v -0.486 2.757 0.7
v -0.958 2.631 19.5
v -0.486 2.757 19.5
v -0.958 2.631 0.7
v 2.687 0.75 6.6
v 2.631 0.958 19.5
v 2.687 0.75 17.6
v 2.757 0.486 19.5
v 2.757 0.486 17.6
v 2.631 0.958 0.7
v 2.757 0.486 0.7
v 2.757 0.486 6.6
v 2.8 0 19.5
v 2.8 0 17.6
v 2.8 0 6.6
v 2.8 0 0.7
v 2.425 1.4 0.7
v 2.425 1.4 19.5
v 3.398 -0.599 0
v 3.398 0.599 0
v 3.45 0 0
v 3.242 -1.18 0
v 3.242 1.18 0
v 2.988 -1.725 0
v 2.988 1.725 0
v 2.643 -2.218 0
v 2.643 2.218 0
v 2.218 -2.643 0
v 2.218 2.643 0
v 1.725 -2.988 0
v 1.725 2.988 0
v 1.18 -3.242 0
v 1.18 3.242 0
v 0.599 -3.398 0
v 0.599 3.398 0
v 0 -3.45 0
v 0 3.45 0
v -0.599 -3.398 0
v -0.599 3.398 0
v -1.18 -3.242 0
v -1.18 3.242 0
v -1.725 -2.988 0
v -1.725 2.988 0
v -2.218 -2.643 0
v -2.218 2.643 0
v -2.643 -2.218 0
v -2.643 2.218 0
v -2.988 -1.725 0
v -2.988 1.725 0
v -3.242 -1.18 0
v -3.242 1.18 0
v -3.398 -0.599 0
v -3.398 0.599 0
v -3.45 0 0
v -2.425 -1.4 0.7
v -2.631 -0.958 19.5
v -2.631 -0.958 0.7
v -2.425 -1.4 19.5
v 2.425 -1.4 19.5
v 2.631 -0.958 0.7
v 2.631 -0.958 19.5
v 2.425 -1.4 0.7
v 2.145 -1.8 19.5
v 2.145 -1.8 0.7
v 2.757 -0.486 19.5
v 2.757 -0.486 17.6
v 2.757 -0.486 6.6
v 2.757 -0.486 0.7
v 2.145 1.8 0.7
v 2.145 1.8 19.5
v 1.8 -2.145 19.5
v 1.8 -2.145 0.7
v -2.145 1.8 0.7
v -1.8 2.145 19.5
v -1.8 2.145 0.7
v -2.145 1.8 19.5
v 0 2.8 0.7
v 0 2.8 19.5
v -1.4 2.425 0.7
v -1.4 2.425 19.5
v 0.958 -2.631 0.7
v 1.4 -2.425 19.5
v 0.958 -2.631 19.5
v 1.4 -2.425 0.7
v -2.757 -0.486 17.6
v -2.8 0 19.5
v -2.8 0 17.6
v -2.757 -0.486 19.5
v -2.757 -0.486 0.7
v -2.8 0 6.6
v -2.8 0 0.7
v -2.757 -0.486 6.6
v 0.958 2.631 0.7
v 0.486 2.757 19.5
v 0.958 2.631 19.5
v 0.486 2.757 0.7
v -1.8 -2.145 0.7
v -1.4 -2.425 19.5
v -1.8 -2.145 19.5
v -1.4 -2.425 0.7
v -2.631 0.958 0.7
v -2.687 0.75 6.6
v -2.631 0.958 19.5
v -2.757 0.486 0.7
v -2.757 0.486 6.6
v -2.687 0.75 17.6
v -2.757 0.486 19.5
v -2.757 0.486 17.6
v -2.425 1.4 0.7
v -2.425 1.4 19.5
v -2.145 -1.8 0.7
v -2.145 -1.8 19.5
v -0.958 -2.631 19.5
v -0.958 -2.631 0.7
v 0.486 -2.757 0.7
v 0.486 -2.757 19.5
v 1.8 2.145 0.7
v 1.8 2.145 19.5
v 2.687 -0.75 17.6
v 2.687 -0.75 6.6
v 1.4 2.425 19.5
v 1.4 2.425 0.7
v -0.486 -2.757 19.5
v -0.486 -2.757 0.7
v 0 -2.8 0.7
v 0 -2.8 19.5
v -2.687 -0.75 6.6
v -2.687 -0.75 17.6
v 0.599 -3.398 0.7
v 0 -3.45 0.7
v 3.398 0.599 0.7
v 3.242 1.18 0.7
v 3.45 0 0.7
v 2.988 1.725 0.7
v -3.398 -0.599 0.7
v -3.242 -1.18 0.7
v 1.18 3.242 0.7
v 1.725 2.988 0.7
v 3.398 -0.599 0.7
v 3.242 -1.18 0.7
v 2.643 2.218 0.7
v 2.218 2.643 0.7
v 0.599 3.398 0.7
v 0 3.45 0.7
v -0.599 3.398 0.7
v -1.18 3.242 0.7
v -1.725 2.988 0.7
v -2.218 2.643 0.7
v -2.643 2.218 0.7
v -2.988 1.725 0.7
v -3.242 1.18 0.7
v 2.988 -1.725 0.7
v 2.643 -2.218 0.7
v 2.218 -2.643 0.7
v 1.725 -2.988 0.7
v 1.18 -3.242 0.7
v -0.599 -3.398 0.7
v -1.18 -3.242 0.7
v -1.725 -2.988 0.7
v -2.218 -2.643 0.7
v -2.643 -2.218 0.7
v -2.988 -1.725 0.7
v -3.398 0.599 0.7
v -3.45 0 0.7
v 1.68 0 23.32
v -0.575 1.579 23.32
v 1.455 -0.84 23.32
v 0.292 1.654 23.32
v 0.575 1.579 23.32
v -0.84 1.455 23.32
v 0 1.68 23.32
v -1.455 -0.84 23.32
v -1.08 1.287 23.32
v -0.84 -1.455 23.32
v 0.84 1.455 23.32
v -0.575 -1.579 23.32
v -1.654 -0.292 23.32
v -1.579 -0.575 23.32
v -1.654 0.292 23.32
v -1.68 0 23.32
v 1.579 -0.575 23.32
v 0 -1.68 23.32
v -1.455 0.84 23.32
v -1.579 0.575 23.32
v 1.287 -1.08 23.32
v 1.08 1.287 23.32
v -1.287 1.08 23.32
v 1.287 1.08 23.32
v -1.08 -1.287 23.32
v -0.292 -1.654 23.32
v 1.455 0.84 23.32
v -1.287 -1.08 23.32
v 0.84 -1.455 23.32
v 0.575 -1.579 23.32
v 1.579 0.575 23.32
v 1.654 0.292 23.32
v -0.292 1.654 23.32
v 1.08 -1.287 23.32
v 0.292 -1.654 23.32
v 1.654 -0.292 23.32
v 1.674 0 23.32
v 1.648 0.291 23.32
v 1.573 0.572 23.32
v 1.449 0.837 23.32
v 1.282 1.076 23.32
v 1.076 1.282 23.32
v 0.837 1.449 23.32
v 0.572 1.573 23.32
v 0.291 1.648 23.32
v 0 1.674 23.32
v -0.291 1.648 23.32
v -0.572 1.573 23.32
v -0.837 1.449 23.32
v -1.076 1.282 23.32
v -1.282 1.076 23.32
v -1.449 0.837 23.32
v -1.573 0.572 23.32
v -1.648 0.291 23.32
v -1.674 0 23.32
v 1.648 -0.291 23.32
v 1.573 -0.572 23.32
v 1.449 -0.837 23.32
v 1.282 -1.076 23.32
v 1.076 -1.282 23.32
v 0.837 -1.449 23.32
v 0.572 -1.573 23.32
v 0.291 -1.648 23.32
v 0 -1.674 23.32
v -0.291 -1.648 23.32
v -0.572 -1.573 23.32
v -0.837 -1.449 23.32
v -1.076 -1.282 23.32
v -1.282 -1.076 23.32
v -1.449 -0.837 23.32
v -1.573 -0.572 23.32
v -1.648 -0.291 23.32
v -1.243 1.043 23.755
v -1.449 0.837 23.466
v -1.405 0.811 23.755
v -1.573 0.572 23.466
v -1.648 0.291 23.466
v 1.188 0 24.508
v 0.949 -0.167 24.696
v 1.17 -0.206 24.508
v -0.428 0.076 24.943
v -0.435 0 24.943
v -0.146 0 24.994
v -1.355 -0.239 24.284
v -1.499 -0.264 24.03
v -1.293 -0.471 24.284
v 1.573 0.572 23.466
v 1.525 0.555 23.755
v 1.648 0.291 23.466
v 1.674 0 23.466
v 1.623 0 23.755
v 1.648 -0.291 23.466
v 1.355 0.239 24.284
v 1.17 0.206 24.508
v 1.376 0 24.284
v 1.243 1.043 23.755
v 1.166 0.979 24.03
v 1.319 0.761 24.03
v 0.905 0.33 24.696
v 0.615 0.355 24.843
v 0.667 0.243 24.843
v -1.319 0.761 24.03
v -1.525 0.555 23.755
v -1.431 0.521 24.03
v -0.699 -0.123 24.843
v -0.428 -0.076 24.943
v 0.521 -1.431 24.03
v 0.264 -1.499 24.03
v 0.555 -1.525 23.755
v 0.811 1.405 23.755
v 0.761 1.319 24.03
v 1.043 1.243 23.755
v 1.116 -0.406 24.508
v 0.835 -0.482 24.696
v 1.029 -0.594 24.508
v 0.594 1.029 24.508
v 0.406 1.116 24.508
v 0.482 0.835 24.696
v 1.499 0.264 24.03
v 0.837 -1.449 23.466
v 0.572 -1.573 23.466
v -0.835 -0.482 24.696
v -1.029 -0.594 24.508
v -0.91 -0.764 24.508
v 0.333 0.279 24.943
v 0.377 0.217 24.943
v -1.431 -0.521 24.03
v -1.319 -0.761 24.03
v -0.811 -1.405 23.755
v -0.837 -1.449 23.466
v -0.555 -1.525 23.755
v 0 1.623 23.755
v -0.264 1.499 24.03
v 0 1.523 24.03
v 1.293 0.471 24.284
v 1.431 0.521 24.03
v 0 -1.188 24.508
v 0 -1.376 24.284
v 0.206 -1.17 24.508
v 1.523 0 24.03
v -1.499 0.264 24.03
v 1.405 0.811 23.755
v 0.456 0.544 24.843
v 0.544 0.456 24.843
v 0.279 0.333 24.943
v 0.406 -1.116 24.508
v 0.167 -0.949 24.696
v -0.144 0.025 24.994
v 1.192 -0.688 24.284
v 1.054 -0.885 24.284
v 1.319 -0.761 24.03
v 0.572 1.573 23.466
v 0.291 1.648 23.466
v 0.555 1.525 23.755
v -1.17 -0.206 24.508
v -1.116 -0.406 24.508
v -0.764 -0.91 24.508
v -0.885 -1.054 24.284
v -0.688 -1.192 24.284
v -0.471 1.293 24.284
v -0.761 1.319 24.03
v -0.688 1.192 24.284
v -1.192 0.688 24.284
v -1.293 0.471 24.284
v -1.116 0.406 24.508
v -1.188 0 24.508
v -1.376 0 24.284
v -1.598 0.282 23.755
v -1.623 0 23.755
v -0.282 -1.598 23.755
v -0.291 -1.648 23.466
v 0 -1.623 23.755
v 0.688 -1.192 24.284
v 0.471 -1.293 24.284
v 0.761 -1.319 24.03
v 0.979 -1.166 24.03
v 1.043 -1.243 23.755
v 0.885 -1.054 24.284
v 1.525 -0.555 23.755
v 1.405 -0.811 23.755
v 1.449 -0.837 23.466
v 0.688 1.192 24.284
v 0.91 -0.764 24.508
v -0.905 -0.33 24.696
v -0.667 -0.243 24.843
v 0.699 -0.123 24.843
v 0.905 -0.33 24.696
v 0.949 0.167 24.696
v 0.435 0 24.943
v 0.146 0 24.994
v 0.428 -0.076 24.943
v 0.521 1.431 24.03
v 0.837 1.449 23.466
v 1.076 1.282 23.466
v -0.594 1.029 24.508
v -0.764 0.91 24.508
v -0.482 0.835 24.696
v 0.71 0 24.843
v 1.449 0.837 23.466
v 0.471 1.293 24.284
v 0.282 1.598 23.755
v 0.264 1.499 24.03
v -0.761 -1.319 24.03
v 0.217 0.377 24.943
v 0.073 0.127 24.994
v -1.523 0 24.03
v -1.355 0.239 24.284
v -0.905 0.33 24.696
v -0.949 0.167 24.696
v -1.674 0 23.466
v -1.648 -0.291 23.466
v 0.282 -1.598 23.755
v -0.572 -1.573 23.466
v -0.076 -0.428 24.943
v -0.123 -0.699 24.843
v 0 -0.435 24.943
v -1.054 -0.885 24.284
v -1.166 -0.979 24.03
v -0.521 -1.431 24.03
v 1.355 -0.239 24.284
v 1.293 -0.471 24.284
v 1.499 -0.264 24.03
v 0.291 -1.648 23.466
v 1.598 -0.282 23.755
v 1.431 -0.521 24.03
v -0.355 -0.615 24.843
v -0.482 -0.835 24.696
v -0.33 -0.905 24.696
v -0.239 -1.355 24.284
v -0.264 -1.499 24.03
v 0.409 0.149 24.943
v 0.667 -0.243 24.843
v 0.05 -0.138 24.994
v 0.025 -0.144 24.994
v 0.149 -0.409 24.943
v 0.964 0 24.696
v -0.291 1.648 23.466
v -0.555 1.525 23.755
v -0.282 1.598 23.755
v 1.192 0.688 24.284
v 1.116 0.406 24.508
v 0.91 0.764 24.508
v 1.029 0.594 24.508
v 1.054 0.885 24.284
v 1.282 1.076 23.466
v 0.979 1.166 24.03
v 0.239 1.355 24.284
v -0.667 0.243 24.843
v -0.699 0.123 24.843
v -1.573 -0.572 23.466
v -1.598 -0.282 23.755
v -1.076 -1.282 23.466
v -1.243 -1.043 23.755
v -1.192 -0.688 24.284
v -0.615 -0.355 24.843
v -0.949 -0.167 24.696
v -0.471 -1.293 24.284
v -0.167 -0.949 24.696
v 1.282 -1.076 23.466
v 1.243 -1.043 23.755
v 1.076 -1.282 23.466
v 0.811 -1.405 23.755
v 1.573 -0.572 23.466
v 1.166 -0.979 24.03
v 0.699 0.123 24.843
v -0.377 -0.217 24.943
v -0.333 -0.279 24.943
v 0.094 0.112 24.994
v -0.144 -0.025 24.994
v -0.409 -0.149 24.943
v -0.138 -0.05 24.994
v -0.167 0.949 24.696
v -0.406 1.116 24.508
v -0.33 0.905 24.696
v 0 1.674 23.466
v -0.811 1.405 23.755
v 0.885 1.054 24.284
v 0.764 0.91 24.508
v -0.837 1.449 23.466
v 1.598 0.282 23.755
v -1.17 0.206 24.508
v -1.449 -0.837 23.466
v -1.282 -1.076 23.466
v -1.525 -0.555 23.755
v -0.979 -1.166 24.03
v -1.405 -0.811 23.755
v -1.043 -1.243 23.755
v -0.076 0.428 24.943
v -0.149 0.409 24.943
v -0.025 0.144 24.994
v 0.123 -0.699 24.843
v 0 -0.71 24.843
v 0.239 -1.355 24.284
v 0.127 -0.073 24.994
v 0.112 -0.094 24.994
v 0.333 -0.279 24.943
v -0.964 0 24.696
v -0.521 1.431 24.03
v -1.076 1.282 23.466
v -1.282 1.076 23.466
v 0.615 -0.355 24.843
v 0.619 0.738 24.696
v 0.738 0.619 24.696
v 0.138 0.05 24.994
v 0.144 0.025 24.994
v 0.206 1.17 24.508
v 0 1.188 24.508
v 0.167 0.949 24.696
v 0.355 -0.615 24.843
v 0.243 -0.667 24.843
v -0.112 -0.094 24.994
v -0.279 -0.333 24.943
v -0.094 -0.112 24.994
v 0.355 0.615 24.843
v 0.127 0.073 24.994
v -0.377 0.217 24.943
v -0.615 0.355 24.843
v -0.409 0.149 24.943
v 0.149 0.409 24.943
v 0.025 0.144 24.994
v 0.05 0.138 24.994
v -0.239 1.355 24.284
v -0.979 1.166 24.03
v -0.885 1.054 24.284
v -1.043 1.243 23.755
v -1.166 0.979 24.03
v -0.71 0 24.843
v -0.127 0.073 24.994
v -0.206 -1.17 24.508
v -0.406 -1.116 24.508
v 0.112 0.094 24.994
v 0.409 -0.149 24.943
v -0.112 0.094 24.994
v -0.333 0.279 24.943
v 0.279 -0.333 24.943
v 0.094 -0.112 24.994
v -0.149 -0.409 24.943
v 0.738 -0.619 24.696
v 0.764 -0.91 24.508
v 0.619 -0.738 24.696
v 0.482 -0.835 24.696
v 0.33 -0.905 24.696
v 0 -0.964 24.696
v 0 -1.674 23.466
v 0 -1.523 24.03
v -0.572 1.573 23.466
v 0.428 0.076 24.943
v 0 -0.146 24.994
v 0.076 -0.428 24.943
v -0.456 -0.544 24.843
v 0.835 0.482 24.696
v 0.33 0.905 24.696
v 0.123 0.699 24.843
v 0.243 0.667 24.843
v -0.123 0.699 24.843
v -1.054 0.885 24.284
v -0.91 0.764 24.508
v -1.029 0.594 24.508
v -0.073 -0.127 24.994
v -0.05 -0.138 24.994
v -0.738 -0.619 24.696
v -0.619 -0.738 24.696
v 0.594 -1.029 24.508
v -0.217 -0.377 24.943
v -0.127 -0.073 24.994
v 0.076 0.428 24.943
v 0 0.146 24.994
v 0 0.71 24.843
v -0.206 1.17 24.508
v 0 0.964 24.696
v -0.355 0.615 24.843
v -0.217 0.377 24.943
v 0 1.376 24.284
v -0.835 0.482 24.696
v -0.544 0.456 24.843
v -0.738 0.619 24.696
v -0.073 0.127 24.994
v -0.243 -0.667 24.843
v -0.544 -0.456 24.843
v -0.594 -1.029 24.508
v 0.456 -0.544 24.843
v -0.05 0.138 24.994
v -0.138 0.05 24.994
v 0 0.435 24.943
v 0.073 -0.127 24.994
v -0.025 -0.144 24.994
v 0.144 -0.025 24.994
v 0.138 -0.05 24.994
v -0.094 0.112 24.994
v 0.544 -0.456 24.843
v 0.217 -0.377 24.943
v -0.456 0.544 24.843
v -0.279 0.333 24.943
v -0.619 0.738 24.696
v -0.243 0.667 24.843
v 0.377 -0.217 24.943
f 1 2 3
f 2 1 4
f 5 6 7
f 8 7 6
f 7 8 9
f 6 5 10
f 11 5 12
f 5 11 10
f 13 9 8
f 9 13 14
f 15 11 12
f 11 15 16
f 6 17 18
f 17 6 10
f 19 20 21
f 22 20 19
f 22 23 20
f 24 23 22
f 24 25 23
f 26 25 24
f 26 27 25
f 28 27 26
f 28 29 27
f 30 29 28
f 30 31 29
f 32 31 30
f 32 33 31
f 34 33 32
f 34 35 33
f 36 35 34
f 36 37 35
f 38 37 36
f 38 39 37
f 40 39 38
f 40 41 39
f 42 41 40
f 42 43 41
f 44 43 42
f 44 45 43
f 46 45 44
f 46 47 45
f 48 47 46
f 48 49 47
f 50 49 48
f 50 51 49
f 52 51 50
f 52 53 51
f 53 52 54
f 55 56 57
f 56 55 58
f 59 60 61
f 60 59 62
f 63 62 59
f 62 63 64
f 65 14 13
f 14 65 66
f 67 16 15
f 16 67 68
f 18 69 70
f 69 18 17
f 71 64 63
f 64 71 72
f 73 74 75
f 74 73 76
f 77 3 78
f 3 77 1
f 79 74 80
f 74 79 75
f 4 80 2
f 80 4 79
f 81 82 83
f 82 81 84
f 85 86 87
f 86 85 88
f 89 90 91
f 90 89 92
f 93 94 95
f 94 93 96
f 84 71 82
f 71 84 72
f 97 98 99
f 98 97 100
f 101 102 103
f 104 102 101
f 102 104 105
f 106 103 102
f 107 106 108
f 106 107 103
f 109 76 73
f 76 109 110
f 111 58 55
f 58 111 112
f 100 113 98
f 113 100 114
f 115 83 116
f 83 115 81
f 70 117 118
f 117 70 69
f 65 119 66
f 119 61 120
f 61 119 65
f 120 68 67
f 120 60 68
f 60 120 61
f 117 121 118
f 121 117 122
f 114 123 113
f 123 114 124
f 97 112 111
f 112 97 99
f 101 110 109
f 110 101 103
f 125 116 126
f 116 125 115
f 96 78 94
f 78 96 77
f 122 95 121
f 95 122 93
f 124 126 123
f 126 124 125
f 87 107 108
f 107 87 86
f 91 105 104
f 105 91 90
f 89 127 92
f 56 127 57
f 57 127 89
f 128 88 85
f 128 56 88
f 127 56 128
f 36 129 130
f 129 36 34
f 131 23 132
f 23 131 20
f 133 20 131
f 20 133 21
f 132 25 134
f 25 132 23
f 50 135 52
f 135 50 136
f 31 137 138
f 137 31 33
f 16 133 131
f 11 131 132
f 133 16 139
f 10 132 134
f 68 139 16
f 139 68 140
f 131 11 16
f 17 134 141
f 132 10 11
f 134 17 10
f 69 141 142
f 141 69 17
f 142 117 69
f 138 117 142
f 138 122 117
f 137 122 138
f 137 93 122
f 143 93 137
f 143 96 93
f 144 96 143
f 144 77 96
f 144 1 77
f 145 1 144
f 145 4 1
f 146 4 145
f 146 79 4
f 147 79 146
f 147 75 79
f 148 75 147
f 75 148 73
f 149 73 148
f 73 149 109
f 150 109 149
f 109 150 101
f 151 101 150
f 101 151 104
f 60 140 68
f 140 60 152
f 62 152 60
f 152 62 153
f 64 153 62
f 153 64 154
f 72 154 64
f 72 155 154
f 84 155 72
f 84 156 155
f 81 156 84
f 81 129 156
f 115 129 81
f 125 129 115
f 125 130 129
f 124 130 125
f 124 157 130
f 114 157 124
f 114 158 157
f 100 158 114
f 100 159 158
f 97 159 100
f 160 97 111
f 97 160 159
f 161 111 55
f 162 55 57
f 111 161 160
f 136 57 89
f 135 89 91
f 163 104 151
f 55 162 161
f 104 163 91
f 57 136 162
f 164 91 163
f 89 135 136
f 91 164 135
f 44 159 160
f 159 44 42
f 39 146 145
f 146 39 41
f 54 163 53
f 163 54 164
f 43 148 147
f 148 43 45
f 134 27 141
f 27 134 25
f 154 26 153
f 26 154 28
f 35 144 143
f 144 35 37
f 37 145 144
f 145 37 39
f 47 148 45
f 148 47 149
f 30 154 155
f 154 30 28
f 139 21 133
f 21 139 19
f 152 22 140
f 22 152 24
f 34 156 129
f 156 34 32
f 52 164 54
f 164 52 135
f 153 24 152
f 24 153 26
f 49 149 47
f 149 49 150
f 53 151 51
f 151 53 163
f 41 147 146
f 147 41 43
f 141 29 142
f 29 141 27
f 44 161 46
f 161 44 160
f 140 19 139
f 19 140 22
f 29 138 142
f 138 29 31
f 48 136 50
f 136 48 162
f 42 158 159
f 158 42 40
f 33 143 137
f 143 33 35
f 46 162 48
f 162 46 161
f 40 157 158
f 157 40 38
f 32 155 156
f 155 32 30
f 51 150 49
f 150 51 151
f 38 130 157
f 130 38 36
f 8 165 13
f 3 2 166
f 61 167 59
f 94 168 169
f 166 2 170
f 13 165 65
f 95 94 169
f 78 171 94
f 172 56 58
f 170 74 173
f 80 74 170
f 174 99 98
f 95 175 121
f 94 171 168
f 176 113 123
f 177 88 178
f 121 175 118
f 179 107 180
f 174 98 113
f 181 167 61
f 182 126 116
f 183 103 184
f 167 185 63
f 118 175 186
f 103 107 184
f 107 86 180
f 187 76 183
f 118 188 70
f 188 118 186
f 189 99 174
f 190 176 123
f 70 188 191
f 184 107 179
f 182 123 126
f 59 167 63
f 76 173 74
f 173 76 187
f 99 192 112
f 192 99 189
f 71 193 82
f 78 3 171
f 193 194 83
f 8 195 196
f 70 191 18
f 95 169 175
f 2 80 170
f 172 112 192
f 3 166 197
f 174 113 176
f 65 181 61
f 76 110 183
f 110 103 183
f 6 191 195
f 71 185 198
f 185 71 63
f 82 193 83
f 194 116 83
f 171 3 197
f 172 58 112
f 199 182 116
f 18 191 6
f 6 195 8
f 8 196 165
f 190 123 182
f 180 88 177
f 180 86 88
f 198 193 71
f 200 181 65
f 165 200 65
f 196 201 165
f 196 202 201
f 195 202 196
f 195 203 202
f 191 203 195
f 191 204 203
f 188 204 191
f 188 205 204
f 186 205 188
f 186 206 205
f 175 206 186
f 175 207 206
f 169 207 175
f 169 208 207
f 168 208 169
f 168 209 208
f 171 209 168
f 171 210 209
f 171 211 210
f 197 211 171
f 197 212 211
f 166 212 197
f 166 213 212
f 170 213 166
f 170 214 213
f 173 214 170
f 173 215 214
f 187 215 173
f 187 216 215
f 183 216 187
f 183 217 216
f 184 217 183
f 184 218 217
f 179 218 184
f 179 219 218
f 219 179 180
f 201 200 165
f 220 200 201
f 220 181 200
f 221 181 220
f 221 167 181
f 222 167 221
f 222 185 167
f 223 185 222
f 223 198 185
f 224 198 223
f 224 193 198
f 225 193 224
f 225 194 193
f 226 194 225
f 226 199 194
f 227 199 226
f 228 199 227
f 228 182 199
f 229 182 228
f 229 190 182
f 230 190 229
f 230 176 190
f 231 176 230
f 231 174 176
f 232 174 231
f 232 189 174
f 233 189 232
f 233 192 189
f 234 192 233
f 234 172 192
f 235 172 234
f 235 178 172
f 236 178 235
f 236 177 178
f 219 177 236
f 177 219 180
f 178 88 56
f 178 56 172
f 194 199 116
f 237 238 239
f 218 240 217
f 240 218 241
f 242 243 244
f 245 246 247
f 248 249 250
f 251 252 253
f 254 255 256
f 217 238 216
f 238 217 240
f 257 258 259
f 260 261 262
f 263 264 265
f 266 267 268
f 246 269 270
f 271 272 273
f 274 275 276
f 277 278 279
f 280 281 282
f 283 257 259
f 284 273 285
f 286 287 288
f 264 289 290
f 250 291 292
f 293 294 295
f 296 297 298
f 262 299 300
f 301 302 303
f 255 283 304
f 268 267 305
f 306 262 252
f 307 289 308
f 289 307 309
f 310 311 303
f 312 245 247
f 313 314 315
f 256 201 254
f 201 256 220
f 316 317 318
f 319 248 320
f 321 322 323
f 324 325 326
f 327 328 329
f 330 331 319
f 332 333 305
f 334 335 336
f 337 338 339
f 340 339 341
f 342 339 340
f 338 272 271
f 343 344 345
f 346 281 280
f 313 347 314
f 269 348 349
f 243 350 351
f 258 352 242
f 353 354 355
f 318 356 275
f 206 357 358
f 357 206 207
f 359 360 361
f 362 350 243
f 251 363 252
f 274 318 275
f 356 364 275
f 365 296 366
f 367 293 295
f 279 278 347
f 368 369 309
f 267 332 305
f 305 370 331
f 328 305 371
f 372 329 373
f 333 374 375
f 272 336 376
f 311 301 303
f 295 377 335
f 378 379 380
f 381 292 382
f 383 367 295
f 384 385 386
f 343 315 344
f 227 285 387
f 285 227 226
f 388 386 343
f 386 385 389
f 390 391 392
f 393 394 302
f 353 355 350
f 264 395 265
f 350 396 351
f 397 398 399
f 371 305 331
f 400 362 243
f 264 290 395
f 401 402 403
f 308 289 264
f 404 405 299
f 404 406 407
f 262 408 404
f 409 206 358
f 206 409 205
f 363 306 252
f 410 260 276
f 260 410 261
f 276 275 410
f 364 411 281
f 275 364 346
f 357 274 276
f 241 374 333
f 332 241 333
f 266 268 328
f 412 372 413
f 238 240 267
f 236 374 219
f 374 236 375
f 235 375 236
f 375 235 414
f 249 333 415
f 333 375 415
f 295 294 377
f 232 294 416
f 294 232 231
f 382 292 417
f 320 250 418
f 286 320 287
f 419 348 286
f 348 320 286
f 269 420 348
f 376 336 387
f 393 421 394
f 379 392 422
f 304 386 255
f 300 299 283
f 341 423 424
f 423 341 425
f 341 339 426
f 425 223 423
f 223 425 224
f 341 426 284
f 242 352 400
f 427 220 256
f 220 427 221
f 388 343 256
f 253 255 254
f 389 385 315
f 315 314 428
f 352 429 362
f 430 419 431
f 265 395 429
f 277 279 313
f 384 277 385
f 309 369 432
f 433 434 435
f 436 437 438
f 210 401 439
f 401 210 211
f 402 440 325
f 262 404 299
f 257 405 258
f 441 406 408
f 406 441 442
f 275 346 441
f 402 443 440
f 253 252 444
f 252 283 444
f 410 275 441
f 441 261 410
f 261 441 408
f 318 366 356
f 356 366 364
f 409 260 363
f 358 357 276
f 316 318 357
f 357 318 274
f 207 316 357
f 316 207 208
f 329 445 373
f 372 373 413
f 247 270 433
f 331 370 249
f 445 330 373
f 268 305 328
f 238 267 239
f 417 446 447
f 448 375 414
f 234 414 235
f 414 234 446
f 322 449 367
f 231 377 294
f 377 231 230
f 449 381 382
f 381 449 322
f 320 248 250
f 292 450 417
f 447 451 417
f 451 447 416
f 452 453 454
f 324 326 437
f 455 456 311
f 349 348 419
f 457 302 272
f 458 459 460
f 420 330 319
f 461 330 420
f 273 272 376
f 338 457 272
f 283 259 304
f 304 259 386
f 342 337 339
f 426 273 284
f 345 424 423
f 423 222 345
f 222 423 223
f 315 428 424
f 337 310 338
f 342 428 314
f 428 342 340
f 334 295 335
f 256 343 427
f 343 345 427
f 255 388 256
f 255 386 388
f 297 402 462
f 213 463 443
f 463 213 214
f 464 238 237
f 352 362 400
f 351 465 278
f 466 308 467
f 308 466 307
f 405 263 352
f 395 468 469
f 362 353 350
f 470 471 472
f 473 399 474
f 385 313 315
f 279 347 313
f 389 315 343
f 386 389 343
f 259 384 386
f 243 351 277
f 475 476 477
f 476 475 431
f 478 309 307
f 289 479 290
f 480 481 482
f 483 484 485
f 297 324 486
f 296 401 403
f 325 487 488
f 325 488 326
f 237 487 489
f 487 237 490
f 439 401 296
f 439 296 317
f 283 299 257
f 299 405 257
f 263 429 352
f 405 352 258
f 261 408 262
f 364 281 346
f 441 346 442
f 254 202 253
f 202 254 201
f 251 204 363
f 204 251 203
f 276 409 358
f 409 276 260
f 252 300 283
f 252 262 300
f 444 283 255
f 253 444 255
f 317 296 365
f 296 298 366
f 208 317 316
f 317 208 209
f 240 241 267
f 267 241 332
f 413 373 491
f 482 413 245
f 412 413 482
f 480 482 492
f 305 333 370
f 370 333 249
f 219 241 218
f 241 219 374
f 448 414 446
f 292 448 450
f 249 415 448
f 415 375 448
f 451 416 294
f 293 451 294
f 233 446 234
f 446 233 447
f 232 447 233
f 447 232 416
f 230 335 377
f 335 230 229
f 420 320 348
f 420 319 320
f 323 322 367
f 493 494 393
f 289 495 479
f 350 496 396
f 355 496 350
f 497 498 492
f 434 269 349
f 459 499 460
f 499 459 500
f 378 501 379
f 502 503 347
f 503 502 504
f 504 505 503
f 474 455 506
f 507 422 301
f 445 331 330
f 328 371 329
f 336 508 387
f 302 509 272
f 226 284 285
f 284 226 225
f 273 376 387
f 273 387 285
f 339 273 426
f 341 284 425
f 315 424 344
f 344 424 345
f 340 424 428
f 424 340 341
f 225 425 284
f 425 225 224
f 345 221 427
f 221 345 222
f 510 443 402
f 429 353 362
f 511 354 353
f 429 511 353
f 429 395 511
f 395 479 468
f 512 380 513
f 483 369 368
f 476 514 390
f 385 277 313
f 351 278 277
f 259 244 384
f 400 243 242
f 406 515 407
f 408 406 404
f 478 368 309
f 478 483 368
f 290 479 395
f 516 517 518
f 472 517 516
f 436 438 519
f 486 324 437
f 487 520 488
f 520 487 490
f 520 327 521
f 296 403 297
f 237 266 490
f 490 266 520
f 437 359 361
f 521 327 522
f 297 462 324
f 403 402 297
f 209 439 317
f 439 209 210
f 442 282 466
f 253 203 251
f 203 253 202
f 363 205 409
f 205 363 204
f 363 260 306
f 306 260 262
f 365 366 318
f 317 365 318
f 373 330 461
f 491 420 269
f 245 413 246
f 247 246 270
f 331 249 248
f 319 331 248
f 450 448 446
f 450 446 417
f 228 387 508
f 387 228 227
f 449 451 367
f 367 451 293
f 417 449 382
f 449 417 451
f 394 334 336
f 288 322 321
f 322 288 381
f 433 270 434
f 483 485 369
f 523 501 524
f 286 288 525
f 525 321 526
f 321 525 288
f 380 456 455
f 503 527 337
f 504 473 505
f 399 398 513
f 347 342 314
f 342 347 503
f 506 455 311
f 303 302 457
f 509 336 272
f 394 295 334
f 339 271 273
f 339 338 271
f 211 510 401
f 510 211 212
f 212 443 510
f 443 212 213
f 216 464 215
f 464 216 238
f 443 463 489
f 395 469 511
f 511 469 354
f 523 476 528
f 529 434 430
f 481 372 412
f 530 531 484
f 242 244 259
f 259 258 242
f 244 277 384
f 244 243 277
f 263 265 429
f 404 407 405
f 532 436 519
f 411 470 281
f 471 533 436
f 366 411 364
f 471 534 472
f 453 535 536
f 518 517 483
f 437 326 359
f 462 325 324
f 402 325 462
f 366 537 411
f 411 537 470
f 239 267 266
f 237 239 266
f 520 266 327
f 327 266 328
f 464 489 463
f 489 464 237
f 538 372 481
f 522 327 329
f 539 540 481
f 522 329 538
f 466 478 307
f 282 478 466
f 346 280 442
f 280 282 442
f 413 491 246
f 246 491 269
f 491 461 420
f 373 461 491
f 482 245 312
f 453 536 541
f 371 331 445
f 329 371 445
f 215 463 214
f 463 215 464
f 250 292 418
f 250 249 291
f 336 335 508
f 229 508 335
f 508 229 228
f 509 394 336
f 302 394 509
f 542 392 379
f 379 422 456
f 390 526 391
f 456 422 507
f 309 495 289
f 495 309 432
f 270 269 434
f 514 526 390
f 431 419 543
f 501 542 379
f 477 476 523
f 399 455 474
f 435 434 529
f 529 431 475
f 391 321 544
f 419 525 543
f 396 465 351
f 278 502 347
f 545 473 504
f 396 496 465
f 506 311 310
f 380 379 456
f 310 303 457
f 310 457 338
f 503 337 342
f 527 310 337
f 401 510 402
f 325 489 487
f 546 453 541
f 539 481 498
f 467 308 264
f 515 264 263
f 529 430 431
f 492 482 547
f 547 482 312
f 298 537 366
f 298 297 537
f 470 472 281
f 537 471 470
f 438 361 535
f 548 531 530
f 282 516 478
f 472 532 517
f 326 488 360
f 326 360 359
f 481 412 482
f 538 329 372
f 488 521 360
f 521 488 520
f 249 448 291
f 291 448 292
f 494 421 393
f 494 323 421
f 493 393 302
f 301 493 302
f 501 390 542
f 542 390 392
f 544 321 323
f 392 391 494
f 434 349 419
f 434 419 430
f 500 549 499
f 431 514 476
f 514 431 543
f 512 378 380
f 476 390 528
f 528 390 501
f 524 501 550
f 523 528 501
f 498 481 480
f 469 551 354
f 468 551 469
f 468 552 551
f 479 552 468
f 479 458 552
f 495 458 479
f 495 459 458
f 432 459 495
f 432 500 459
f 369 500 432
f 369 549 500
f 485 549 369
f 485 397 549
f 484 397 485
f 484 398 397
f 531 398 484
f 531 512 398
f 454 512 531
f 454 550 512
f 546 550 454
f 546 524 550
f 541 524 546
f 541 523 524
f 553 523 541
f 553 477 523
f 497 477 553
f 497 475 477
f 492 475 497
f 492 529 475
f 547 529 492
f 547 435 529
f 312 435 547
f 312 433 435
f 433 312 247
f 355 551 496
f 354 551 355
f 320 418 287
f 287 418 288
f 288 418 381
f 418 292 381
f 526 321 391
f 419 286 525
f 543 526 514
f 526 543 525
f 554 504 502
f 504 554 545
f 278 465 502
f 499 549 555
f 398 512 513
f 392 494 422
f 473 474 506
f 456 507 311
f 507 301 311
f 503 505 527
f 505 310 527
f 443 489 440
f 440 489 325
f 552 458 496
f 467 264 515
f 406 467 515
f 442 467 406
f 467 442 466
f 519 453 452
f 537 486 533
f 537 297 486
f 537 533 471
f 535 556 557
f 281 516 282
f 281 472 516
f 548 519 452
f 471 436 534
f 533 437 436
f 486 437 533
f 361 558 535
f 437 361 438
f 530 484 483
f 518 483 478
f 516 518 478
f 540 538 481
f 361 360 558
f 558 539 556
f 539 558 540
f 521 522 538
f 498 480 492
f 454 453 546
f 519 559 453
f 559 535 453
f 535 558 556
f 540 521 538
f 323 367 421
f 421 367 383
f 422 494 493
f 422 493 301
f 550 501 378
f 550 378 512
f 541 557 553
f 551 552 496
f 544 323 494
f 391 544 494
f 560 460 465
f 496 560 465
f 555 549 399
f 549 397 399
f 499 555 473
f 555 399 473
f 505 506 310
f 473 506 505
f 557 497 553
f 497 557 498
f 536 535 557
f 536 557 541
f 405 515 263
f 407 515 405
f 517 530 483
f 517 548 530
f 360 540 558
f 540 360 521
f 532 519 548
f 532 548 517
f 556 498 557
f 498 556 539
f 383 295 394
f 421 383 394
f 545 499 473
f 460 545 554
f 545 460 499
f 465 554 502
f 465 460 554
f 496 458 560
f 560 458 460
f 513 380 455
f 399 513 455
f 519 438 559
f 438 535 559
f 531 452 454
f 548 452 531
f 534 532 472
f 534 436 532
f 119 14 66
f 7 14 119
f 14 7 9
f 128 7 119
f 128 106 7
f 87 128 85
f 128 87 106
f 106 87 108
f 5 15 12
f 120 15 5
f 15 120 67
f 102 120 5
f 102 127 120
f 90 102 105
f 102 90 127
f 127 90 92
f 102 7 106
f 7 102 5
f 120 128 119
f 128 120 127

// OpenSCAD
$fn=36;  //quality of render.  default=0   //number of faces.

casing_diameter = 5.6;  //wikipedia=5.7   measured=5.6
casing_height = 15.5+4;   //wikipedia=15.6  measured=15.5 
rim_diameter = 6.9;     //wikipedia=7.1   measured=6.7
rim_height = .7;         //wikipedia=1.1   measured=1,0.8
total_height = 25;      //wikipedia=25.4  measured=25
slot_start = 6.6;       //measured=6.6
slot_width = 1.5;       //measured=1.3
slot_length = 11;     //measured=10.3  //10.8 //11.3 

casing_radius = casing_diameter/2; 

module complete_bullet()
{
//casing
cylinder(h=casing_height, d1=casing_diameter, d2=casing_diameter, center=false);

//rim
cylinder(h=rim_height, d1=rim_diameter, d2=rim_diameter, center=false);

//bullet taper to half
//translate([0,0,casing_height])
//cylinder(h=total_height-casing_height, r1=casing_radius, r2=casing_radius/2, center=false);

//bullet rounded tip
//cylinder(h=total_height-casing_radius, d1=casing_diameter, d2=casing_diameter, center=false);
//translate([0,0,total_height-casing_radius]) sphere(d=casing_diameter);
    
//bullet taper plus rounded tip
taper_end = .6;
translate([0,0,casing_height])
cylinder(h=total_height-casing_height-casing_radius*taper_end, 
    d1=casing_diameter, d2=casing_diameter*taper_end, center=false);
translate([0,0,total_height-casing_radius*taper_end]) sphere(r=casing_radius*taper_end);    
}

module feed_slot()
{
translate([-10,-slot_width/2,slot_start]) cube([20,slot_width,slot_length],center=false);
}

difference()
{
complete_bullet();
feed_slot();
}
